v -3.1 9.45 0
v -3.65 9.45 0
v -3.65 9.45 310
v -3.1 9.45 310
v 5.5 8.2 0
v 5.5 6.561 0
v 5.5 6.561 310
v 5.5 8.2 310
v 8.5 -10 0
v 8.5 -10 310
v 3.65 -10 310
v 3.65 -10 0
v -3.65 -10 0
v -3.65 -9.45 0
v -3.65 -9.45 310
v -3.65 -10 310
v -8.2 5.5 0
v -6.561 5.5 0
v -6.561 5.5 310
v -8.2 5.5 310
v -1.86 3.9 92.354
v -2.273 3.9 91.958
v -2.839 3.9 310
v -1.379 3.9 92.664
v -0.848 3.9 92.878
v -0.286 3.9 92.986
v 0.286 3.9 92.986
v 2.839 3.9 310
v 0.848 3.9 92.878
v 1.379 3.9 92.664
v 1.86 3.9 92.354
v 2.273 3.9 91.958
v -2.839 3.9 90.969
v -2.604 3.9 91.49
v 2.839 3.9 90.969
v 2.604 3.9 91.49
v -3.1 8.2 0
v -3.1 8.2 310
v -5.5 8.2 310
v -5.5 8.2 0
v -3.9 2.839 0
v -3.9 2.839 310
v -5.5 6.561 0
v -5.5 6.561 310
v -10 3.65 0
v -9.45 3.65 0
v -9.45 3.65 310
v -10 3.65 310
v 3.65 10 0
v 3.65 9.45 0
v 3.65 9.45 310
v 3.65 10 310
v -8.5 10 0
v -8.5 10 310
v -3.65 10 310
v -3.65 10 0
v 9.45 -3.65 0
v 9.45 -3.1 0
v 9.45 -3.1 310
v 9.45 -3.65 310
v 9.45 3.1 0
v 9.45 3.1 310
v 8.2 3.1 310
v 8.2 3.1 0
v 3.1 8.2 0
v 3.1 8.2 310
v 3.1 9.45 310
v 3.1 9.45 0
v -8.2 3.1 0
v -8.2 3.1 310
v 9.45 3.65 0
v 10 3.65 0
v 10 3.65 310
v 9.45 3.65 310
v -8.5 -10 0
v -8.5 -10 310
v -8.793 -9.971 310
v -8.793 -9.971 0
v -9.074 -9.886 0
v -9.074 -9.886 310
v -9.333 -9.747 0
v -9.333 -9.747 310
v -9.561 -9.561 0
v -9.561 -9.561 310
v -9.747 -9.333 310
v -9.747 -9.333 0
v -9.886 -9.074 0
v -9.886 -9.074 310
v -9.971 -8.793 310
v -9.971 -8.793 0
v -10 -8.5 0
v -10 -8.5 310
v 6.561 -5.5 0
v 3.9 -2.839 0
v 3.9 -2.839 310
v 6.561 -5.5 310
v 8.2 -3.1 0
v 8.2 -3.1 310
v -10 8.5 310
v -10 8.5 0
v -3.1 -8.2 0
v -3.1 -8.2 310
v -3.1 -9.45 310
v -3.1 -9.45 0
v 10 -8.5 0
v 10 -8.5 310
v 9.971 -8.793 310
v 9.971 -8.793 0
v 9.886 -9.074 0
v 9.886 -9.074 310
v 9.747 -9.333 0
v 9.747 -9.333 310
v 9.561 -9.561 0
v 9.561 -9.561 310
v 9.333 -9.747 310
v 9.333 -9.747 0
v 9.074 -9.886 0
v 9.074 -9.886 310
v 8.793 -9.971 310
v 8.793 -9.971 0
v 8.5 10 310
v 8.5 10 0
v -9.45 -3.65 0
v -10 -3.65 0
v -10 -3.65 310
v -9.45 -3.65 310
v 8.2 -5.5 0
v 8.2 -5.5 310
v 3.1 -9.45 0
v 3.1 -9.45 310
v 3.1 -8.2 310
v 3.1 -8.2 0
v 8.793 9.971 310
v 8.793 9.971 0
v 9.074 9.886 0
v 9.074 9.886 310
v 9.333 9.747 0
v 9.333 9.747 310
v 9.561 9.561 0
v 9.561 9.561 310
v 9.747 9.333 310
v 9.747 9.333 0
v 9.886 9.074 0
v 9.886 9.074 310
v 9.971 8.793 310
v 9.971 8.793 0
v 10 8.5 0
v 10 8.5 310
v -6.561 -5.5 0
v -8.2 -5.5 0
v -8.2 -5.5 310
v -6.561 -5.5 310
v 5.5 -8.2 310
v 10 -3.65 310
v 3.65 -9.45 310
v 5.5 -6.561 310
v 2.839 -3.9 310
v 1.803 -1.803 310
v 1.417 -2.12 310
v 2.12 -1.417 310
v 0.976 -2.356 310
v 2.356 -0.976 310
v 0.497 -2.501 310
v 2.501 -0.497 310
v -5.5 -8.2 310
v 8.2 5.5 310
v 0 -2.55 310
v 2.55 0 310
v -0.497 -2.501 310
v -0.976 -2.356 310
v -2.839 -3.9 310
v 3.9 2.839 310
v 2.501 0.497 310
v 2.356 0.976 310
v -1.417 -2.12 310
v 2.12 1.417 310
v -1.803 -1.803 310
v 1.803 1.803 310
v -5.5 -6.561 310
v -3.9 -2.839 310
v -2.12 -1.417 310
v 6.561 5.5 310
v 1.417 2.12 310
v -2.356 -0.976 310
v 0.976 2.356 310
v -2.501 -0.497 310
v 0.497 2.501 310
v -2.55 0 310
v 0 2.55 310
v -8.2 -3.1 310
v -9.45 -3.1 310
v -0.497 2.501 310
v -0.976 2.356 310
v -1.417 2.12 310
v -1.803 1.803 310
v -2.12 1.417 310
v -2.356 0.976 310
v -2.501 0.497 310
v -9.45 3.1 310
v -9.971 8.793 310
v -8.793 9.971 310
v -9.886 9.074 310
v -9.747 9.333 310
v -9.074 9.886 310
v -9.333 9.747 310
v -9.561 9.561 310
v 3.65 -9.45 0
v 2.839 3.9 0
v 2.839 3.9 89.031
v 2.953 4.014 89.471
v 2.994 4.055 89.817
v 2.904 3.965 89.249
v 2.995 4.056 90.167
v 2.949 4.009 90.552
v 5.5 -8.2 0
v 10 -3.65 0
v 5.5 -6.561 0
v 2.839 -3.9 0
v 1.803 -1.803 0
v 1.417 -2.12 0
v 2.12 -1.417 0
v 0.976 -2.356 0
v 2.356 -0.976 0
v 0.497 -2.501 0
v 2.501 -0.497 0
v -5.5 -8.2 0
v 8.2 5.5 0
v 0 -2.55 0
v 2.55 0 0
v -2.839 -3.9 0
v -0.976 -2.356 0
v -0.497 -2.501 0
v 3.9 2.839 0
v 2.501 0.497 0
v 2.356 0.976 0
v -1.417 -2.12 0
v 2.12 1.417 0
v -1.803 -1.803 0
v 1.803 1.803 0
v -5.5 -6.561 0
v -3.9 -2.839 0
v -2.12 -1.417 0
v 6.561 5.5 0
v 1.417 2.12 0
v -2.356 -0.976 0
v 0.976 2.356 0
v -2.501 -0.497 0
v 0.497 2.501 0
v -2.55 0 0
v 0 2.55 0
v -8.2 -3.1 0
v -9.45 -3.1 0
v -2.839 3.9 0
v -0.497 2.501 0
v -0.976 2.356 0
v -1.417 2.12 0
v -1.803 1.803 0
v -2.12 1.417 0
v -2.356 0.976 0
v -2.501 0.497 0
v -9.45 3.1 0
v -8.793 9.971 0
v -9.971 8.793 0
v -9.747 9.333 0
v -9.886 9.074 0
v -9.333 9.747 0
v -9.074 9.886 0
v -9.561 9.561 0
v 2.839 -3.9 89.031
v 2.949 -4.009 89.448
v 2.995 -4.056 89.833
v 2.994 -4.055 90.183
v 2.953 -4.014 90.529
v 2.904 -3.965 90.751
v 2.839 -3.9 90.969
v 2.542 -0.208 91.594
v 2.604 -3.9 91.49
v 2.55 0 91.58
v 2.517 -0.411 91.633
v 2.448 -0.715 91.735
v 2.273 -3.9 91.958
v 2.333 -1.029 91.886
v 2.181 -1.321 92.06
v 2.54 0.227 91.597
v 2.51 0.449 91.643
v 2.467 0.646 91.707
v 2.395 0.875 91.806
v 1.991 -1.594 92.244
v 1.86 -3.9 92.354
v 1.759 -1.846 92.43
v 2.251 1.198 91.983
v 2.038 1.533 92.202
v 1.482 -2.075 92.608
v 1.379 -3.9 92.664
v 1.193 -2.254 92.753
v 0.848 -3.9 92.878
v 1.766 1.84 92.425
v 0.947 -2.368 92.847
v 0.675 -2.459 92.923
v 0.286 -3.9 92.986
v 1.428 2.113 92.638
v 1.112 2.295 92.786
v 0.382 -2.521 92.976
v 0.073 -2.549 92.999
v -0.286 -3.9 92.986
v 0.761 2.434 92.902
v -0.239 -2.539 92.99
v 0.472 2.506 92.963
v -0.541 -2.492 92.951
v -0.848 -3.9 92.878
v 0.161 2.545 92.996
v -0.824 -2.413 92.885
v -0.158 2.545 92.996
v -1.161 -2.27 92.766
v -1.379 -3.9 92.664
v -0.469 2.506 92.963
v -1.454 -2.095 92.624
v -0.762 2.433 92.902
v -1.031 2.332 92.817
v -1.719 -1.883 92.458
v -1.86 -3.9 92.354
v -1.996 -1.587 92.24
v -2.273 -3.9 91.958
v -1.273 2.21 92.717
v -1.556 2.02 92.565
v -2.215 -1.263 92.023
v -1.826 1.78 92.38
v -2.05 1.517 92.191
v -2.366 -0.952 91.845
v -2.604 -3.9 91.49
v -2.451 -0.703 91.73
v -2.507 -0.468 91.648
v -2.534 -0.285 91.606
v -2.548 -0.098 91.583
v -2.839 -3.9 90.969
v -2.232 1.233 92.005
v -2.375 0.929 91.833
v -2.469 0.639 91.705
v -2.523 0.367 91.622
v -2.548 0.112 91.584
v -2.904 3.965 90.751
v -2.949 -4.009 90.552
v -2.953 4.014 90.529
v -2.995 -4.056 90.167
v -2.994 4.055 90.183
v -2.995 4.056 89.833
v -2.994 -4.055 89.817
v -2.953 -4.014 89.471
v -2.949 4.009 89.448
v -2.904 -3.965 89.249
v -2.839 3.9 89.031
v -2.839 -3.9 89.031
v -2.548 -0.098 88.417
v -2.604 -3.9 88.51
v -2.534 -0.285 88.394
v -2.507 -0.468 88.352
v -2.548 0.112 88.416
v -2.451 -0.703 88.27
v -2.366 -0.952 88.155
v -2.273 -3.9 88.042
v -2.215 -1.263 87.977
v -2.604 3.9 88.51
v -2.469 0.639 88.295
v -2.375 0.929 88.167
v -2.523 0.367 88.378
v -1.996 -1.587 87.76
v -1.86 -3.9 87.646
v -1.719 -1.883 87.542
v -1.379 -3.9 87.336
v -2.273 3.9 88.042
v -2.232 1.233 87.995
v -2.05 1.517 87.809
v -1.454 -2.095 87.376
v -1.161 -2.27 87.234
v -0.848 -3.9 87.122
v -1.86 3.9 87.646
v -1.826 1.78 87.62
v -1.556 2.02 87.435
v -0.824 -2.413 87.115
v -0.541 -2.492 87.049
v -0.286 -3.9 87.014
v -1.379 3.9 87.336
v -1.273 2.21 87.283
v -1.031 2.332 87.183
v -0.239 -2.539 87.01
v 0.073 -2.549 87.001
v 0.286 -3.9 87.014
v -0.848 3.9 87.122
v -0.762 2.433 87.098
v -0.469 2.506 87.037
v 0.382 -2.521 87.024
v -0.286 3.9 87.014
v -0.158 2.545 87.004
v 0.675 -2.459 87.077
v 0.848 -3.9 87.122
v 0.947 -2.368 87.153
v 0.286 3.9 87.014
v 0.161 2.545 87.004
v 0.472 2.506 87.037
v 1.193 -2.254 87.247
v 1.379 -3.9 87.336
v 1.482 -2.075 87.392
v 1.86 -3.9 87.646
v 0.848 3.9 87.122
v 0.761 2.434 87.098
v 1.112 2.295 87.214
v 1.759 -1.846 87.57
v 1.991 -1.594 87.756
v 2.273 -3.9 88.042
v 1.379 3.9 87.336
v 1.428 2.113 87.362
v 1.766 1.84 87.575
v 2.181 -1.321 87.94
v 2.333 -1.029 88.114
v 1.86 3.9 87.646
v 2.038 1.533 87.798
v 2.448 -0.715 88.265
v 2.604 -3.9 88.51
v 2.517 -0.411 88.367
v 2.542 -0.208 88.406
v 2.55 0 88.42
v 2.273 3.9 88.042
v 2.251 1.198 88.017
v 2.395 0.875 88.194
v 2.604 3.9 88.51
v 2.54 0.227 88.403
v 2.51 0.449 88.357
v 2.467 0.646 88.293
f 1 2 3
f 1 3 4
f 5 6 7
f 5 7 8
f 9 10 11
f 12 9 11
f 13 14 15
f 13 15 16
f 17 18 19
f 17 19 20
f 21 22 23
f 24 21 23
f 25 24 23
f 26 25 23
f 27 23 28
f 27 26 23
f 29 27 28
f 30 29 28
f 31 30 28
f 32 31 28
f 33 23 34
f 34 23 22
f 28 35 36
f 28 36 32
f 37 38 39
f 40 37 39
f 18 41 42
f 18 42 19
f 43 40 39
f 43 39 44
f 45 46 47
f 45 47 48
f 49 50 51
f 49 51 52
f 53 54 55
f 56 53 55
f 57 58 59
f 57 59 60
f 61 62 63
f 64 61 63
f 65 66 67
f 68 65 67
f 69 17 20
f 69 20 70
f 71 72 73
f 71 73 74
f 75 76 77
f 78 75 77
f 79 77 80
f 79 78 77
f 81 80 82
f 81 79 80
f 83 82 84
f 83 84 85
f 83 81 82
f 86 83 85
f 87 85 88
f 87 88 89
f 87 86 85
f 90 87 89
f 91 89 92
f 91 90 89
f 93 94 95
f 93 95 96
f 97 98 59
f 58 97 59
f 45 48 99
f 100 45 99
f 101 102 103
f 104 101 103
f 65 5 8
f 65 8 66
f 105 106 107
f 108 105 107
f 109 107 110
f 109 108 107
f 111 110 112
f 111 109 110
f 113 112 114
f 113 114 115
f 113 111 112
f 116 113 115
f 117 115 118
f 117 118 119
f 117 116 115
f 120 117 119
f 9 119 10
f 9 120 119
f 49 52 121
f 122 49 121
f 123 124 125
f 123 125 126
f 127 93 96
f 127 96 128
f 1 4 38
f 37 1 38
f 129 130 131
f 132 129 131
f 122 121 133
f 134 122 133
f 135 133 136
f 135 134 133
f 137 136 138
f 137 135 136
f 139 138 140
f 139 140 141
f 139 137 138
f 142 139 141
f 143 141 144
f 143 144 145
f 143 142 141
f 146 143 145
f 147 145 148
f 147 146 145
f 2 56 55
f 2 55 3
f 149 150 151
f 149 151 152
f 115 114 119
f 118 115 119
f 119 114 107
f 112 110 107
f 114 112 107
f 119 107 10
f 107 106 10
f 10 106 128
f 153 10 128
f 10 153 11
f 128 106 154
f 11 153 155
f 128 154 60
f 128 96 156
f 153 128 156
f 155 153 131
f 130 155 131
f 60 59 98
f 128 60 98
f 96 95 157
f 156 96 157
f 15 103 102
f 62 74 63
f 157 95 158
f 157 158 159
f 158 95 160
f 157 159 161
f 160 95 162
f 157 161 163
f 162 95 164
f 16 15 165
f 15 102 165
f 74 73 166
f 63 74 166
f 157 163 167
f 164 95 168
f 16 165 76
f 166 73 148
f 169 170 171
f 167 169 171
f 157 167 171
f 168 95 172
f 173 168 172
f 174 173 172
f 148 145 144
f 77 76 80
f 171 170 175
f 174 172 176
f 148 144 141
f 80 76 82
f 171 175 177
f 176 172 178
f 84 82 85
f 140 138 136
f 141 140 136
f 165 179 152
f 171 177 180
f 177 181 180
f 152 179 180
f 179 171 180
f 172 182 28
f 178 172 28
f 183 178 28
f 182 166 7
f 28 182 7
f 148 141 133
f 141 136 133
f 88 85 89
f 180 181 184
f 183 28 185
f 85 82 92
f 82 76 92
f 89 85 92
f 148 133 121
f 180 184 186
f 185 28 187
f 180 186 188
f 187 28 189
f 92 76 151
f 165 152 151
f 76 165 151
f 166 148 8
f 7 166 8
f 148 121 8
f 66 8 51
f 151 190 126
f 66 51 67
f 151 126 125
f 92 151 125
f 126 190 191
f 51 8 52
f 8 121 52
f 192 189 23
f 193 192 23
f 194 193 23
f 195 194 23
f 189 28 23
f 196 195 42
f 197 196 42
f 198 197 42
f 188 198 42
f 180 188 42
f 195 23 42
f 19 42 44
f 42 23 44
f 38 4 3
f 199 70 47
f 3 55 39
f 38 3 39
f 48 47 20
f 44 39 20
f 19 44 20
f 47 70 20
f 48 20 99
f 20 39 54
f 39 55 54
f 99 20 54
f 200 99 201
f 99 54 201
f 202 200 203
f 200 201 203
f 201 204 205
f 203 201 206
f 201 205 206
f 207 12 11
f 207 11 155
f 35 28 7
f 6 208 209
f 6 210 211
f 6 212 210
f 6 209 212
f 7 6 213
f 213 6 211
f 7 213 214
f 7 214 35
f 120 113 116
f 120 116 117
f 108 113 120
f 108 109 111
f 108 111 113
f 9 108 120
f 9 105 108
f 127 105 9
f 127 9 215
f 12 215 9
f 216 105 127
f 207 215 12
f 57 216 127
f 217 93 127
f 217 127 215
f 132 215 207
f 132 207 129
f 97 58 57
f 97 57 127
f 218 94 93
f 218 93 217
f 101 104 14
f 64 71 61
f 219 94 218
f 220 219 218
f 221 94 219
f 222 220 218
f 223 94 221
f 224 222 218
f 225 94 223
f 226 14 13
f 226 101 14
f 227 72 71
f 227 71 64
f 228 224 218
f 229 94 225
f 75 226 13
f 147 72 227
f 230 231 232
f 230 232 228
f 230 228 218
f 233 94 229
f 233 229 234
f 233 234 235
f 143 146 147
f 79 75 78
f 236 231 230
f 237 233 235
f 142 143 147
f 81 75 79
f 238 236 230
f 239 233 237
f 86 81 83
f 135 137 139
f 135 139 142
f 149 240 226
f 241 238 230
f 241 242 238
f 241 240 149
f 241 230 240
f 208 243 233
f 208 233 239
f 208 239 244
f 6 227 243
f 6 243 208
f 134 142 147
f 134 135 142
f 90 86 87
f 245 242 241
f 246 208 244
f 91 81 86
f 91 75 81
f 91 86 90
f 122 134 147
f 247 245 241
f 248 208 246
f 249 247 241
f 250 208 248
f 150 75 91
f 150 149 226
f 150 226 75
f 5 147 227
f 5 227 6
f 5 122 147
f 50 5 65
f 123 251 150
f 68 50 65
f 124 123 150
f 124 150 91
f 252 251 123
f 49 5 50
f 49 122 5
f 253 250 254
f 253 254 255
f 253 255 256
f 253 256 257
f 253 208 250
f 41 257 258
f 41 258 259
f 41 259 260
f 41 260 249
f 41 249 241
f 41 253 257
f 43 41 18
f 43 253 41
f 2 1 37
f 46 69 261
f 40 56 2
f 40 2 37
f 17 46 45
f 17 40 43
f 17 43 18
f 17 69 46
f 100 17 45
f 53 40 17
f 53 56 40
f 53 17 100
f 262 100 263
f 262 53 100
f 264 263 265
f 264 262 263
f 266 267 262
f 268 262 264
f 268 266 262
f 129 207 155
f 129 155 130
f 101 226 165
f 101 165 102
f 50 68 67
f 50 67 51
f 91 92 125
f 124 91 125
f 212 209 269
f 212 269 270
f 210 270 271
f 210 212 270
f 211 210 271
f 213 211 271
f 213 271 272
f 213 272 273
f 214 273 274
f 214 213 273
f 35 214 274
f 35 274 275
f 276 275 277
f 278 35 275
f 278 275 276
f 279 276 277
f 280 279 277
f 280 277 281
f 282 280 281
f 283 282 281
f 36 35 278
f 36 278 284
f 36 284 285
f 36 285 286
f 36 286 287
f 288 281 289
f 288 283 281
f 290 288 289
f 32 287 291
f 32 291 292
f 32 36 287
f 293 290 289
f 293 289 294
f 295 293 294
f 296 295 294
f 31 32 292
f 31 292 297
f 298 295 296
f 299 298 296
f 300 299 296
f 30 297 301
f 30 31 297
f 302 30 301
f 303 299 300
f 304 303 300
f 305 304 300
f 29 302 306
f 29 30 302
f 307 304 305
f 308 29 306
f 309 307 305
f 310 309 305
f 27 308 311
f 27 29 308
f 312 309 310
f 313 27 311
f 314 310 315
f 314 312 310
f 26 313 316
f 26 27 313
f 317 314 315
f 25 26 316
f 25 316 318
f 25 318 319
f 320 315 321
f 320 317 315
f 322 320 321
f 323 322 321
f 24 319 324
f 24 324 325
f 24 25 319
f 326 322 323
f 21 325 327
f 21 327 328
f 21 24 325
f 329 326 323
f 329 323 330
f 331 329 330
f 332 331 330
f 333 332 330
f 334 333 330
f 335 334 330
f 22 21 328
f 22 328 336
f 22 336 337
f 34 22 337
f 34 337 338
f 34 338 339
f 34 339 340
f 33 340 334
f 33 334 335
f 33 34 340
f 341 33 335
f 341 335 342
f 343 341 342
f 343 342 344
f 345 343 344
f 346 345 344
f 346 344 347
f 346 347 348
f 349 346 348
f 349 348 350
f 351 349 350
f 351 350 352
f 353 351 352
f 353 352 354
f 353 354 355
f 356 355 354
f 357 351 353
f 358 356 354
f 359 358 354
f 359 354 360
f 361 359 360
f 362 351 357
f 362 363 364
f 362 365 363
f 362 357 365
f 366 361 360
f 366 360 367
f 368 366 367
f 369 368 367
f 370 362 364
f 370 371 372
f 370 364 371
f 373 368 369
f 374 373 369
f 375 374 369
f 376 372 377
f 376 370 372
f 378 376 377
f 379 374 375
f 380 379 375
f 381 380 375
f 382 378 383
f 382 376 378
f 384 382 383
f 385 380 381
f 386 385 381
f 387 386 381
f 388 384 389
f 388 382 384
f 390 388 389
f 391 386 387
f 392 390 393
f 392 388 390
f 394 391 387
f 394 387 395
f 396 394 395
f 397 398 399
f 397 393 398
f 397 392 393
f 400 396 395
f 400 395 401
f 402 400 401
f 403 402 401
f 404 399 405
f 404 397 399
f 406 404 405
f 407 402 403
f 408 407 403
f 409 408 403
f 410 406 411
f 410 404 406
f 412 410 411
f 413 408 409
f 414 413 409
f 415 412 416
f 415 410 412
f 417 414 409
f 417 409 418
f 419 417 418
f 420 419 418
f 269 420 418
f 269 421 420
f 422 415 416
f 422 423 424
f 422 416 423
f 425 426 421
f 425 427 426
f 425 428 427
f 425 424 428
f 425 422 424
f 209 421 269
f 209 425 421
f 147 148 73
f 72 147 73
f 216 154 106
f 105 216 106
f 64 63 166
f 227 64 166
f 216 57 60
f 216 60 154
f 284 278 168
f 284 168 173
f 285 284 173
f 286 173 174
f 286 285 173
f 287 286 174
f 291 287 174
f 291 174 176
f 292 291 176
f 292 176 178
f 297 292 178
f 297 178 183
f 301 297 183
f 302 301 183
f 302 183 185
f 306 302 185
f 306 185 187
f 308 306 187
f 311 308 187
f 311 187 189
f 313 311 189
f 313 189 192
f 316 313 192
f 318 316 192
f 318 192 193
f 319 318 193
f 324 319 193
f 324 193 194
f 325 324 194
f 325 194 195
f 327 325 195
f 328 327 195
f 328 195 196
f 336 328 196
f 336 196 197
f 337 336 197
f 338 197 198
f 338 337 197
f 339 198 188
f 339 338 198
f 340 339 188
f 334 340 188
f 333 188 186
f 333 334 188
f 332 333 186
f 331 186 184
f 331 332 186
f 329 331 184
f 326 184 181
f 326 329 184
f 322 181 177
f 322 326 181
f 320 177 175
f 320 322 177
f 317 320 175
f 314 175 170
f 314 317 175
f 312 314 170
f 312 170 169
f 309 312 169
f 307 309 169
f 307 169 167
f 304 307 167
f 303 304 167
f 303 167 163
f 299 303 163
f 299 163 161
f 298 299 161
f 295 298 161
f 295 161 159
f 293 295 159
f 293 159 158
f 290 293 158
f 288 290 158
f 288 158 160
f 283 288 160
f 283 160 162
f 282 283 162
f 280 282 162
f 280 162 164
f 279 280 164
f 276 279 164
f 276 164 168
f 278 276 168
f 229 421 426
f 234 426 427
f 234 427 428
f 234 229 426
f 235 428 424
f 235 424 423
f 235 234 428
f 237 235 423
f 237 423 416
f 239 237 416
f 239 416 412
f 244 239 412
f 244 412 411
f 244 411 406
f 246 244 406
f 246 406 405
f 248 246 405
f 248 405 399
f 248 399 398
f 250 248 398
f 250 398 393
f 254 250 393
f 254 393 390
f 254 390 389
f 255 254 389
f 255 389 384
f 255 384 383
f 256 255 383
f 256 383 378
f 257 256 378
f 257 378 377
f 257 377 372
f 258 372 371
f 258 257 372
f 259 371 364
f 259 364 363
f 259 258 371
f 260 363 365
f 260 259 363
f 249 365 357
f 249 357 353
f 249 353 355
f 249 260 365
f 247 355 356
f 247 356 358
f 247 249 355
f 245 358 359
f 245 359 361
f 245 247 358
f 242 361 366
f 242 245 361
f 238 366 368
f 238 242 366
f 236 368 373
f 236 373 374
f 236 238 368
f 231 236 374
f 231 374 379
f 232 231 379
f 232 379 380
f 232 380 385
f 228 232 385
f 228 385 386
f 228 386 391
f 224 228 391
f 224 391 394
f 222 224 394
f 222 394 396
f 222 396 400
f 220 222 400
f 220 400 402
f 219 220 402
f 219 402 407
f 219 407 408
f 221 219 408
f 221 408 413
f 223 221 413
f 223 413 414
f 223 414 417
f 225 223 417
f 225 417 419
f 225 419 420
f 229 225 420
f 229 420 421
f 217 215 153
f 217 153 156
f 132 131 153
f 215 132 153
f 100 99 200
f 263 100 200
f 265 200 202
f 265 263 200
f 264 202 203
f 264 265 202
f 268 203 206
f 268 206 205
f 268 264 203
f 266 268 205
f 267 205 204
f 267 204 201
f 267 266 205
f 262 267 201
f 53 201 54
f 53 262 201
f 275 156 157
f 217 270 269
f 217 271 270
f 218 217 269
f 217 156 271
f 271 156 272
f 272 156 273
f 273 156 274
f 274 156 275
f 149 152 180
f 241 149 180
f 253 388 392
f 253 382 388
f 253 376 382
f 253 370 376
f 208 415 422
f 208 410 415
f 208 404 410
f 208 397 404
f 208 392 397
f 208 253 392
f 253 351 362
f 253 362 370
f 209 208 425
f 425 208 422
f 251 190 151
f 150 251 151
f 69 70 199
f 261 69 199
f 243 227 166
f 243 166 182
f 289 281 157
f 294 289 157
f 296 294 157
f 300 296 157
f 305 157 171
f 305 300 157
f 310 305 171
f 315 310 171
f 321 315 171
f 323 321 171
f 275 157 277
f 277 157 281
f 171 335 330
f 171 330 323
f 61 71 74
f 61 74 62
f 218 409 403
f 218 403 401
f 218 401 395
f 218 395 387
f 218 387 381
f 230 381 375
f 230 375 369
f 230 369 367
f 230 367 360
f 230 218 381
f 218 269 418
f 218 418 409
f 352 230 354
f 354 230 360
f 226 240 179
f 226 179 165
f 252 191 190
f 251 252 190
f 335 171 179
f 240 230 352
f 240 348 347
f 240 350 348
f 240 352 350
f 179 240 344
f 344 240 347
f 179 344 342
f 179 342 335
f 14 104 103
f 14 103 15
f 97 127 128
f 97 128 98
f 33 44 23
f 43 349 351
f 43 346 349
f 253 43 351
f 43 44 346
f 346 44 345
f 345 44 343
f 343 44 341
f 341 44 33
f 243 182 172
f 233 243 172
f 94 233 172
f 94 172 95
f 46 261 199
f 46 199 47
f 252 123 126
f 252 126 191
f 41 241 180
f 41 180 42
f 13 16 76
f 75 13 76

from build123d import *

# Parameters (mm, degrees)
SKETCH_2_R               = 2.55
EXTRUDE_1_DEPTH          = 310
CUT_EXTRUDE_1_DEPTH      = 311.805405358
CUT_EXTRUDE_1_DEPTH_BACK = 311.805405358
SKETCH_3_R               = 3


with BuildPart() as part:
    # 草图2 → 凸台-拉伸1 (new body)
    with BuildSketch(Plane.XY):
        with BuildLine():
            Line((-3.9, 2.839339828), (-6.560660172, 5.5))
            Line((-6.560660172, 5.5), (-8.2, 5.5))
            Line((-8.2, 5.5), (-8.2, 3.1))
            Line((-8.2, 3.1), (-9.45, 3.1))
            Line((-9.45, 3.1), (-9.45, 3.65))
            Line((-9.45, 3.65), (-10, 3.65))
            Line((-10, 3.65), (-10, 8.5))
            ThreePointArc((-10, 8.5), (-9.560660172, 9.560660172), (-8.5, 10))
            Line((-8.5, 10), (-3.65, 10))
            Line((-3.65, 10), (-3.65, 9.45))
            Line((-3.65, 9.45), (-3.1, 9.45))
            Line((-3.1, 9.45), (-3.1, 8.2))
            Line((-3.1, 8.2), (-5.5, 8.2))
            Line((-5.5, 8.2), (-5.5, 6.560660172))
            Line((-5.5, 6.560660172), (-2.839339828, 3.9))
            Line((-2.839339828, 3.9), (2.839339828, 3.9))
            Line((2.839339828, 3.9), (5.5, 6.560660172))
            Line((5.5, 6.560660172), (5.5, 8.2))
            Line((5.5, 8.2), (3.1, 8.2))
            Line((3.1, 8.2), (3.1, 9.45))
            Line((3.1, 9.45), (3.65, 9.45))
            Line((3.65, 9.45), (3.65, 10))
            Line((3.65, 10), (8.5, 10))
            ThreePointArc((8.5, 10), (9.560660172, 9.560660172), (10, 8.5))
            Line((10, 8.5), (10, 3.65))
            Line((10, 3.65), (9.45, 3.65))
            Line((9.45, 3.65), (9.45, 3.1))
            Line((9.45, 3.1), (8.2, 3.1))
            Line((8.2, 3.1), (8.2, 5.5))
            Line((8.2, 5.5), (6.560660172, 5.5))
            Line((6.560660172, 5.5), (3.9, 2.839339828))
            Line((3.9, 2.839339828), (3.9, -2.839339828))
            Line((3.9, -2.839339828), (6.560660172, -5.5))
            Line((6.560660172, -5.5), (8.2, -5.5))
            Line((8.2, -5.5), (8.2, -3.1))
            Line((8.2, -3.1), (9.45, -3.1))
            Line((9.45, -3.1), (9.45, -3.65))
            Line((9.45, -3.65), (10, -3.65))
            Line((10, -3.65), (10, -8.5))
            ThreePointArc((10, -8.5), (9.560660172, -9.560660172), (8.5, -10))
            Line((8.5, -10), (3.65, -10))
            Line((3.65, -10), (3.65, -9.45))
            Line((3.65, -9.45), (3.1, -9.45))
            Line((3.1, -9.45), (3.1, -8.2))
            Line((3.1, -8.2), (5.5, -8.2))
            Line((5.5, -8.2), (5.5, -6.560660172))
            Line((5.5, -6.560660172), (2.839339828, -3.9))
            Line((2.839339828, -3.9), (-2.839339828, -3.9))
            Line((-2.839339828, -3.9), (-5.5, -6.560660172))
            Line((-5.5, -6.560660172), (-5.5, -8.2))
            Line((-5.5, -8.2), (-3.1, -8.2))
            Line((-3.1, -8.2), (-3.1, -9.45))
            Line((-3.1, -9.45), (-3.65, -9.45))
            Line((-3.65, -9.45), (-3.65, -10))
            Line((-3.65, -10), (-8.5, -10))
            ThreePointArc((-8.5, -10), (-9.560660172, -9.560660172), (-10, -8.5))
            Line((-10, -8.5), (-10, -3.65))
            Line((-10, -3.65), (-9.45, -3.65))
            Line((-9.45, -3.65), (-9.45, -3.1))
            Line((-9.45, -3.1), (-8.2, -3.1))
            Line((-8.2, -3.1), (-8.2, -5.5))
            Line((-8.2, -5.5), (-6.560660172, -5.5))
            Line((-6.560660172, -5.5), (-3.9, -2.839339828))
            Line((-3.9, -2.839339828), (-3.9, 2.839339828))
        make_face()
        Circle(SKETCH_2_R, mode=Mode.SUBTRACT)
    extrude(amount=EXTRUDE_1_DEPTH)

    # 草图3 → 切除-拉伸1 (cut, two sides: drawn at the far end of the back side and taken through both)
    with BuildSketch(Plane.XZ.offset(10).offset(-CUT_EXTRUDE_1_DEPTH_BACK)):
        with Locations(Location((0, 90, 0), (0, 0, 341.164003842))):
            Circle(SKETCH_3_R)
    extrude(amount=CUT_EXTRUDE_1_DEPTH + CUT_EXTRUDE_1_DEPTH_BACK, mode=Mode.SUBTRACT)


solid = part.part
